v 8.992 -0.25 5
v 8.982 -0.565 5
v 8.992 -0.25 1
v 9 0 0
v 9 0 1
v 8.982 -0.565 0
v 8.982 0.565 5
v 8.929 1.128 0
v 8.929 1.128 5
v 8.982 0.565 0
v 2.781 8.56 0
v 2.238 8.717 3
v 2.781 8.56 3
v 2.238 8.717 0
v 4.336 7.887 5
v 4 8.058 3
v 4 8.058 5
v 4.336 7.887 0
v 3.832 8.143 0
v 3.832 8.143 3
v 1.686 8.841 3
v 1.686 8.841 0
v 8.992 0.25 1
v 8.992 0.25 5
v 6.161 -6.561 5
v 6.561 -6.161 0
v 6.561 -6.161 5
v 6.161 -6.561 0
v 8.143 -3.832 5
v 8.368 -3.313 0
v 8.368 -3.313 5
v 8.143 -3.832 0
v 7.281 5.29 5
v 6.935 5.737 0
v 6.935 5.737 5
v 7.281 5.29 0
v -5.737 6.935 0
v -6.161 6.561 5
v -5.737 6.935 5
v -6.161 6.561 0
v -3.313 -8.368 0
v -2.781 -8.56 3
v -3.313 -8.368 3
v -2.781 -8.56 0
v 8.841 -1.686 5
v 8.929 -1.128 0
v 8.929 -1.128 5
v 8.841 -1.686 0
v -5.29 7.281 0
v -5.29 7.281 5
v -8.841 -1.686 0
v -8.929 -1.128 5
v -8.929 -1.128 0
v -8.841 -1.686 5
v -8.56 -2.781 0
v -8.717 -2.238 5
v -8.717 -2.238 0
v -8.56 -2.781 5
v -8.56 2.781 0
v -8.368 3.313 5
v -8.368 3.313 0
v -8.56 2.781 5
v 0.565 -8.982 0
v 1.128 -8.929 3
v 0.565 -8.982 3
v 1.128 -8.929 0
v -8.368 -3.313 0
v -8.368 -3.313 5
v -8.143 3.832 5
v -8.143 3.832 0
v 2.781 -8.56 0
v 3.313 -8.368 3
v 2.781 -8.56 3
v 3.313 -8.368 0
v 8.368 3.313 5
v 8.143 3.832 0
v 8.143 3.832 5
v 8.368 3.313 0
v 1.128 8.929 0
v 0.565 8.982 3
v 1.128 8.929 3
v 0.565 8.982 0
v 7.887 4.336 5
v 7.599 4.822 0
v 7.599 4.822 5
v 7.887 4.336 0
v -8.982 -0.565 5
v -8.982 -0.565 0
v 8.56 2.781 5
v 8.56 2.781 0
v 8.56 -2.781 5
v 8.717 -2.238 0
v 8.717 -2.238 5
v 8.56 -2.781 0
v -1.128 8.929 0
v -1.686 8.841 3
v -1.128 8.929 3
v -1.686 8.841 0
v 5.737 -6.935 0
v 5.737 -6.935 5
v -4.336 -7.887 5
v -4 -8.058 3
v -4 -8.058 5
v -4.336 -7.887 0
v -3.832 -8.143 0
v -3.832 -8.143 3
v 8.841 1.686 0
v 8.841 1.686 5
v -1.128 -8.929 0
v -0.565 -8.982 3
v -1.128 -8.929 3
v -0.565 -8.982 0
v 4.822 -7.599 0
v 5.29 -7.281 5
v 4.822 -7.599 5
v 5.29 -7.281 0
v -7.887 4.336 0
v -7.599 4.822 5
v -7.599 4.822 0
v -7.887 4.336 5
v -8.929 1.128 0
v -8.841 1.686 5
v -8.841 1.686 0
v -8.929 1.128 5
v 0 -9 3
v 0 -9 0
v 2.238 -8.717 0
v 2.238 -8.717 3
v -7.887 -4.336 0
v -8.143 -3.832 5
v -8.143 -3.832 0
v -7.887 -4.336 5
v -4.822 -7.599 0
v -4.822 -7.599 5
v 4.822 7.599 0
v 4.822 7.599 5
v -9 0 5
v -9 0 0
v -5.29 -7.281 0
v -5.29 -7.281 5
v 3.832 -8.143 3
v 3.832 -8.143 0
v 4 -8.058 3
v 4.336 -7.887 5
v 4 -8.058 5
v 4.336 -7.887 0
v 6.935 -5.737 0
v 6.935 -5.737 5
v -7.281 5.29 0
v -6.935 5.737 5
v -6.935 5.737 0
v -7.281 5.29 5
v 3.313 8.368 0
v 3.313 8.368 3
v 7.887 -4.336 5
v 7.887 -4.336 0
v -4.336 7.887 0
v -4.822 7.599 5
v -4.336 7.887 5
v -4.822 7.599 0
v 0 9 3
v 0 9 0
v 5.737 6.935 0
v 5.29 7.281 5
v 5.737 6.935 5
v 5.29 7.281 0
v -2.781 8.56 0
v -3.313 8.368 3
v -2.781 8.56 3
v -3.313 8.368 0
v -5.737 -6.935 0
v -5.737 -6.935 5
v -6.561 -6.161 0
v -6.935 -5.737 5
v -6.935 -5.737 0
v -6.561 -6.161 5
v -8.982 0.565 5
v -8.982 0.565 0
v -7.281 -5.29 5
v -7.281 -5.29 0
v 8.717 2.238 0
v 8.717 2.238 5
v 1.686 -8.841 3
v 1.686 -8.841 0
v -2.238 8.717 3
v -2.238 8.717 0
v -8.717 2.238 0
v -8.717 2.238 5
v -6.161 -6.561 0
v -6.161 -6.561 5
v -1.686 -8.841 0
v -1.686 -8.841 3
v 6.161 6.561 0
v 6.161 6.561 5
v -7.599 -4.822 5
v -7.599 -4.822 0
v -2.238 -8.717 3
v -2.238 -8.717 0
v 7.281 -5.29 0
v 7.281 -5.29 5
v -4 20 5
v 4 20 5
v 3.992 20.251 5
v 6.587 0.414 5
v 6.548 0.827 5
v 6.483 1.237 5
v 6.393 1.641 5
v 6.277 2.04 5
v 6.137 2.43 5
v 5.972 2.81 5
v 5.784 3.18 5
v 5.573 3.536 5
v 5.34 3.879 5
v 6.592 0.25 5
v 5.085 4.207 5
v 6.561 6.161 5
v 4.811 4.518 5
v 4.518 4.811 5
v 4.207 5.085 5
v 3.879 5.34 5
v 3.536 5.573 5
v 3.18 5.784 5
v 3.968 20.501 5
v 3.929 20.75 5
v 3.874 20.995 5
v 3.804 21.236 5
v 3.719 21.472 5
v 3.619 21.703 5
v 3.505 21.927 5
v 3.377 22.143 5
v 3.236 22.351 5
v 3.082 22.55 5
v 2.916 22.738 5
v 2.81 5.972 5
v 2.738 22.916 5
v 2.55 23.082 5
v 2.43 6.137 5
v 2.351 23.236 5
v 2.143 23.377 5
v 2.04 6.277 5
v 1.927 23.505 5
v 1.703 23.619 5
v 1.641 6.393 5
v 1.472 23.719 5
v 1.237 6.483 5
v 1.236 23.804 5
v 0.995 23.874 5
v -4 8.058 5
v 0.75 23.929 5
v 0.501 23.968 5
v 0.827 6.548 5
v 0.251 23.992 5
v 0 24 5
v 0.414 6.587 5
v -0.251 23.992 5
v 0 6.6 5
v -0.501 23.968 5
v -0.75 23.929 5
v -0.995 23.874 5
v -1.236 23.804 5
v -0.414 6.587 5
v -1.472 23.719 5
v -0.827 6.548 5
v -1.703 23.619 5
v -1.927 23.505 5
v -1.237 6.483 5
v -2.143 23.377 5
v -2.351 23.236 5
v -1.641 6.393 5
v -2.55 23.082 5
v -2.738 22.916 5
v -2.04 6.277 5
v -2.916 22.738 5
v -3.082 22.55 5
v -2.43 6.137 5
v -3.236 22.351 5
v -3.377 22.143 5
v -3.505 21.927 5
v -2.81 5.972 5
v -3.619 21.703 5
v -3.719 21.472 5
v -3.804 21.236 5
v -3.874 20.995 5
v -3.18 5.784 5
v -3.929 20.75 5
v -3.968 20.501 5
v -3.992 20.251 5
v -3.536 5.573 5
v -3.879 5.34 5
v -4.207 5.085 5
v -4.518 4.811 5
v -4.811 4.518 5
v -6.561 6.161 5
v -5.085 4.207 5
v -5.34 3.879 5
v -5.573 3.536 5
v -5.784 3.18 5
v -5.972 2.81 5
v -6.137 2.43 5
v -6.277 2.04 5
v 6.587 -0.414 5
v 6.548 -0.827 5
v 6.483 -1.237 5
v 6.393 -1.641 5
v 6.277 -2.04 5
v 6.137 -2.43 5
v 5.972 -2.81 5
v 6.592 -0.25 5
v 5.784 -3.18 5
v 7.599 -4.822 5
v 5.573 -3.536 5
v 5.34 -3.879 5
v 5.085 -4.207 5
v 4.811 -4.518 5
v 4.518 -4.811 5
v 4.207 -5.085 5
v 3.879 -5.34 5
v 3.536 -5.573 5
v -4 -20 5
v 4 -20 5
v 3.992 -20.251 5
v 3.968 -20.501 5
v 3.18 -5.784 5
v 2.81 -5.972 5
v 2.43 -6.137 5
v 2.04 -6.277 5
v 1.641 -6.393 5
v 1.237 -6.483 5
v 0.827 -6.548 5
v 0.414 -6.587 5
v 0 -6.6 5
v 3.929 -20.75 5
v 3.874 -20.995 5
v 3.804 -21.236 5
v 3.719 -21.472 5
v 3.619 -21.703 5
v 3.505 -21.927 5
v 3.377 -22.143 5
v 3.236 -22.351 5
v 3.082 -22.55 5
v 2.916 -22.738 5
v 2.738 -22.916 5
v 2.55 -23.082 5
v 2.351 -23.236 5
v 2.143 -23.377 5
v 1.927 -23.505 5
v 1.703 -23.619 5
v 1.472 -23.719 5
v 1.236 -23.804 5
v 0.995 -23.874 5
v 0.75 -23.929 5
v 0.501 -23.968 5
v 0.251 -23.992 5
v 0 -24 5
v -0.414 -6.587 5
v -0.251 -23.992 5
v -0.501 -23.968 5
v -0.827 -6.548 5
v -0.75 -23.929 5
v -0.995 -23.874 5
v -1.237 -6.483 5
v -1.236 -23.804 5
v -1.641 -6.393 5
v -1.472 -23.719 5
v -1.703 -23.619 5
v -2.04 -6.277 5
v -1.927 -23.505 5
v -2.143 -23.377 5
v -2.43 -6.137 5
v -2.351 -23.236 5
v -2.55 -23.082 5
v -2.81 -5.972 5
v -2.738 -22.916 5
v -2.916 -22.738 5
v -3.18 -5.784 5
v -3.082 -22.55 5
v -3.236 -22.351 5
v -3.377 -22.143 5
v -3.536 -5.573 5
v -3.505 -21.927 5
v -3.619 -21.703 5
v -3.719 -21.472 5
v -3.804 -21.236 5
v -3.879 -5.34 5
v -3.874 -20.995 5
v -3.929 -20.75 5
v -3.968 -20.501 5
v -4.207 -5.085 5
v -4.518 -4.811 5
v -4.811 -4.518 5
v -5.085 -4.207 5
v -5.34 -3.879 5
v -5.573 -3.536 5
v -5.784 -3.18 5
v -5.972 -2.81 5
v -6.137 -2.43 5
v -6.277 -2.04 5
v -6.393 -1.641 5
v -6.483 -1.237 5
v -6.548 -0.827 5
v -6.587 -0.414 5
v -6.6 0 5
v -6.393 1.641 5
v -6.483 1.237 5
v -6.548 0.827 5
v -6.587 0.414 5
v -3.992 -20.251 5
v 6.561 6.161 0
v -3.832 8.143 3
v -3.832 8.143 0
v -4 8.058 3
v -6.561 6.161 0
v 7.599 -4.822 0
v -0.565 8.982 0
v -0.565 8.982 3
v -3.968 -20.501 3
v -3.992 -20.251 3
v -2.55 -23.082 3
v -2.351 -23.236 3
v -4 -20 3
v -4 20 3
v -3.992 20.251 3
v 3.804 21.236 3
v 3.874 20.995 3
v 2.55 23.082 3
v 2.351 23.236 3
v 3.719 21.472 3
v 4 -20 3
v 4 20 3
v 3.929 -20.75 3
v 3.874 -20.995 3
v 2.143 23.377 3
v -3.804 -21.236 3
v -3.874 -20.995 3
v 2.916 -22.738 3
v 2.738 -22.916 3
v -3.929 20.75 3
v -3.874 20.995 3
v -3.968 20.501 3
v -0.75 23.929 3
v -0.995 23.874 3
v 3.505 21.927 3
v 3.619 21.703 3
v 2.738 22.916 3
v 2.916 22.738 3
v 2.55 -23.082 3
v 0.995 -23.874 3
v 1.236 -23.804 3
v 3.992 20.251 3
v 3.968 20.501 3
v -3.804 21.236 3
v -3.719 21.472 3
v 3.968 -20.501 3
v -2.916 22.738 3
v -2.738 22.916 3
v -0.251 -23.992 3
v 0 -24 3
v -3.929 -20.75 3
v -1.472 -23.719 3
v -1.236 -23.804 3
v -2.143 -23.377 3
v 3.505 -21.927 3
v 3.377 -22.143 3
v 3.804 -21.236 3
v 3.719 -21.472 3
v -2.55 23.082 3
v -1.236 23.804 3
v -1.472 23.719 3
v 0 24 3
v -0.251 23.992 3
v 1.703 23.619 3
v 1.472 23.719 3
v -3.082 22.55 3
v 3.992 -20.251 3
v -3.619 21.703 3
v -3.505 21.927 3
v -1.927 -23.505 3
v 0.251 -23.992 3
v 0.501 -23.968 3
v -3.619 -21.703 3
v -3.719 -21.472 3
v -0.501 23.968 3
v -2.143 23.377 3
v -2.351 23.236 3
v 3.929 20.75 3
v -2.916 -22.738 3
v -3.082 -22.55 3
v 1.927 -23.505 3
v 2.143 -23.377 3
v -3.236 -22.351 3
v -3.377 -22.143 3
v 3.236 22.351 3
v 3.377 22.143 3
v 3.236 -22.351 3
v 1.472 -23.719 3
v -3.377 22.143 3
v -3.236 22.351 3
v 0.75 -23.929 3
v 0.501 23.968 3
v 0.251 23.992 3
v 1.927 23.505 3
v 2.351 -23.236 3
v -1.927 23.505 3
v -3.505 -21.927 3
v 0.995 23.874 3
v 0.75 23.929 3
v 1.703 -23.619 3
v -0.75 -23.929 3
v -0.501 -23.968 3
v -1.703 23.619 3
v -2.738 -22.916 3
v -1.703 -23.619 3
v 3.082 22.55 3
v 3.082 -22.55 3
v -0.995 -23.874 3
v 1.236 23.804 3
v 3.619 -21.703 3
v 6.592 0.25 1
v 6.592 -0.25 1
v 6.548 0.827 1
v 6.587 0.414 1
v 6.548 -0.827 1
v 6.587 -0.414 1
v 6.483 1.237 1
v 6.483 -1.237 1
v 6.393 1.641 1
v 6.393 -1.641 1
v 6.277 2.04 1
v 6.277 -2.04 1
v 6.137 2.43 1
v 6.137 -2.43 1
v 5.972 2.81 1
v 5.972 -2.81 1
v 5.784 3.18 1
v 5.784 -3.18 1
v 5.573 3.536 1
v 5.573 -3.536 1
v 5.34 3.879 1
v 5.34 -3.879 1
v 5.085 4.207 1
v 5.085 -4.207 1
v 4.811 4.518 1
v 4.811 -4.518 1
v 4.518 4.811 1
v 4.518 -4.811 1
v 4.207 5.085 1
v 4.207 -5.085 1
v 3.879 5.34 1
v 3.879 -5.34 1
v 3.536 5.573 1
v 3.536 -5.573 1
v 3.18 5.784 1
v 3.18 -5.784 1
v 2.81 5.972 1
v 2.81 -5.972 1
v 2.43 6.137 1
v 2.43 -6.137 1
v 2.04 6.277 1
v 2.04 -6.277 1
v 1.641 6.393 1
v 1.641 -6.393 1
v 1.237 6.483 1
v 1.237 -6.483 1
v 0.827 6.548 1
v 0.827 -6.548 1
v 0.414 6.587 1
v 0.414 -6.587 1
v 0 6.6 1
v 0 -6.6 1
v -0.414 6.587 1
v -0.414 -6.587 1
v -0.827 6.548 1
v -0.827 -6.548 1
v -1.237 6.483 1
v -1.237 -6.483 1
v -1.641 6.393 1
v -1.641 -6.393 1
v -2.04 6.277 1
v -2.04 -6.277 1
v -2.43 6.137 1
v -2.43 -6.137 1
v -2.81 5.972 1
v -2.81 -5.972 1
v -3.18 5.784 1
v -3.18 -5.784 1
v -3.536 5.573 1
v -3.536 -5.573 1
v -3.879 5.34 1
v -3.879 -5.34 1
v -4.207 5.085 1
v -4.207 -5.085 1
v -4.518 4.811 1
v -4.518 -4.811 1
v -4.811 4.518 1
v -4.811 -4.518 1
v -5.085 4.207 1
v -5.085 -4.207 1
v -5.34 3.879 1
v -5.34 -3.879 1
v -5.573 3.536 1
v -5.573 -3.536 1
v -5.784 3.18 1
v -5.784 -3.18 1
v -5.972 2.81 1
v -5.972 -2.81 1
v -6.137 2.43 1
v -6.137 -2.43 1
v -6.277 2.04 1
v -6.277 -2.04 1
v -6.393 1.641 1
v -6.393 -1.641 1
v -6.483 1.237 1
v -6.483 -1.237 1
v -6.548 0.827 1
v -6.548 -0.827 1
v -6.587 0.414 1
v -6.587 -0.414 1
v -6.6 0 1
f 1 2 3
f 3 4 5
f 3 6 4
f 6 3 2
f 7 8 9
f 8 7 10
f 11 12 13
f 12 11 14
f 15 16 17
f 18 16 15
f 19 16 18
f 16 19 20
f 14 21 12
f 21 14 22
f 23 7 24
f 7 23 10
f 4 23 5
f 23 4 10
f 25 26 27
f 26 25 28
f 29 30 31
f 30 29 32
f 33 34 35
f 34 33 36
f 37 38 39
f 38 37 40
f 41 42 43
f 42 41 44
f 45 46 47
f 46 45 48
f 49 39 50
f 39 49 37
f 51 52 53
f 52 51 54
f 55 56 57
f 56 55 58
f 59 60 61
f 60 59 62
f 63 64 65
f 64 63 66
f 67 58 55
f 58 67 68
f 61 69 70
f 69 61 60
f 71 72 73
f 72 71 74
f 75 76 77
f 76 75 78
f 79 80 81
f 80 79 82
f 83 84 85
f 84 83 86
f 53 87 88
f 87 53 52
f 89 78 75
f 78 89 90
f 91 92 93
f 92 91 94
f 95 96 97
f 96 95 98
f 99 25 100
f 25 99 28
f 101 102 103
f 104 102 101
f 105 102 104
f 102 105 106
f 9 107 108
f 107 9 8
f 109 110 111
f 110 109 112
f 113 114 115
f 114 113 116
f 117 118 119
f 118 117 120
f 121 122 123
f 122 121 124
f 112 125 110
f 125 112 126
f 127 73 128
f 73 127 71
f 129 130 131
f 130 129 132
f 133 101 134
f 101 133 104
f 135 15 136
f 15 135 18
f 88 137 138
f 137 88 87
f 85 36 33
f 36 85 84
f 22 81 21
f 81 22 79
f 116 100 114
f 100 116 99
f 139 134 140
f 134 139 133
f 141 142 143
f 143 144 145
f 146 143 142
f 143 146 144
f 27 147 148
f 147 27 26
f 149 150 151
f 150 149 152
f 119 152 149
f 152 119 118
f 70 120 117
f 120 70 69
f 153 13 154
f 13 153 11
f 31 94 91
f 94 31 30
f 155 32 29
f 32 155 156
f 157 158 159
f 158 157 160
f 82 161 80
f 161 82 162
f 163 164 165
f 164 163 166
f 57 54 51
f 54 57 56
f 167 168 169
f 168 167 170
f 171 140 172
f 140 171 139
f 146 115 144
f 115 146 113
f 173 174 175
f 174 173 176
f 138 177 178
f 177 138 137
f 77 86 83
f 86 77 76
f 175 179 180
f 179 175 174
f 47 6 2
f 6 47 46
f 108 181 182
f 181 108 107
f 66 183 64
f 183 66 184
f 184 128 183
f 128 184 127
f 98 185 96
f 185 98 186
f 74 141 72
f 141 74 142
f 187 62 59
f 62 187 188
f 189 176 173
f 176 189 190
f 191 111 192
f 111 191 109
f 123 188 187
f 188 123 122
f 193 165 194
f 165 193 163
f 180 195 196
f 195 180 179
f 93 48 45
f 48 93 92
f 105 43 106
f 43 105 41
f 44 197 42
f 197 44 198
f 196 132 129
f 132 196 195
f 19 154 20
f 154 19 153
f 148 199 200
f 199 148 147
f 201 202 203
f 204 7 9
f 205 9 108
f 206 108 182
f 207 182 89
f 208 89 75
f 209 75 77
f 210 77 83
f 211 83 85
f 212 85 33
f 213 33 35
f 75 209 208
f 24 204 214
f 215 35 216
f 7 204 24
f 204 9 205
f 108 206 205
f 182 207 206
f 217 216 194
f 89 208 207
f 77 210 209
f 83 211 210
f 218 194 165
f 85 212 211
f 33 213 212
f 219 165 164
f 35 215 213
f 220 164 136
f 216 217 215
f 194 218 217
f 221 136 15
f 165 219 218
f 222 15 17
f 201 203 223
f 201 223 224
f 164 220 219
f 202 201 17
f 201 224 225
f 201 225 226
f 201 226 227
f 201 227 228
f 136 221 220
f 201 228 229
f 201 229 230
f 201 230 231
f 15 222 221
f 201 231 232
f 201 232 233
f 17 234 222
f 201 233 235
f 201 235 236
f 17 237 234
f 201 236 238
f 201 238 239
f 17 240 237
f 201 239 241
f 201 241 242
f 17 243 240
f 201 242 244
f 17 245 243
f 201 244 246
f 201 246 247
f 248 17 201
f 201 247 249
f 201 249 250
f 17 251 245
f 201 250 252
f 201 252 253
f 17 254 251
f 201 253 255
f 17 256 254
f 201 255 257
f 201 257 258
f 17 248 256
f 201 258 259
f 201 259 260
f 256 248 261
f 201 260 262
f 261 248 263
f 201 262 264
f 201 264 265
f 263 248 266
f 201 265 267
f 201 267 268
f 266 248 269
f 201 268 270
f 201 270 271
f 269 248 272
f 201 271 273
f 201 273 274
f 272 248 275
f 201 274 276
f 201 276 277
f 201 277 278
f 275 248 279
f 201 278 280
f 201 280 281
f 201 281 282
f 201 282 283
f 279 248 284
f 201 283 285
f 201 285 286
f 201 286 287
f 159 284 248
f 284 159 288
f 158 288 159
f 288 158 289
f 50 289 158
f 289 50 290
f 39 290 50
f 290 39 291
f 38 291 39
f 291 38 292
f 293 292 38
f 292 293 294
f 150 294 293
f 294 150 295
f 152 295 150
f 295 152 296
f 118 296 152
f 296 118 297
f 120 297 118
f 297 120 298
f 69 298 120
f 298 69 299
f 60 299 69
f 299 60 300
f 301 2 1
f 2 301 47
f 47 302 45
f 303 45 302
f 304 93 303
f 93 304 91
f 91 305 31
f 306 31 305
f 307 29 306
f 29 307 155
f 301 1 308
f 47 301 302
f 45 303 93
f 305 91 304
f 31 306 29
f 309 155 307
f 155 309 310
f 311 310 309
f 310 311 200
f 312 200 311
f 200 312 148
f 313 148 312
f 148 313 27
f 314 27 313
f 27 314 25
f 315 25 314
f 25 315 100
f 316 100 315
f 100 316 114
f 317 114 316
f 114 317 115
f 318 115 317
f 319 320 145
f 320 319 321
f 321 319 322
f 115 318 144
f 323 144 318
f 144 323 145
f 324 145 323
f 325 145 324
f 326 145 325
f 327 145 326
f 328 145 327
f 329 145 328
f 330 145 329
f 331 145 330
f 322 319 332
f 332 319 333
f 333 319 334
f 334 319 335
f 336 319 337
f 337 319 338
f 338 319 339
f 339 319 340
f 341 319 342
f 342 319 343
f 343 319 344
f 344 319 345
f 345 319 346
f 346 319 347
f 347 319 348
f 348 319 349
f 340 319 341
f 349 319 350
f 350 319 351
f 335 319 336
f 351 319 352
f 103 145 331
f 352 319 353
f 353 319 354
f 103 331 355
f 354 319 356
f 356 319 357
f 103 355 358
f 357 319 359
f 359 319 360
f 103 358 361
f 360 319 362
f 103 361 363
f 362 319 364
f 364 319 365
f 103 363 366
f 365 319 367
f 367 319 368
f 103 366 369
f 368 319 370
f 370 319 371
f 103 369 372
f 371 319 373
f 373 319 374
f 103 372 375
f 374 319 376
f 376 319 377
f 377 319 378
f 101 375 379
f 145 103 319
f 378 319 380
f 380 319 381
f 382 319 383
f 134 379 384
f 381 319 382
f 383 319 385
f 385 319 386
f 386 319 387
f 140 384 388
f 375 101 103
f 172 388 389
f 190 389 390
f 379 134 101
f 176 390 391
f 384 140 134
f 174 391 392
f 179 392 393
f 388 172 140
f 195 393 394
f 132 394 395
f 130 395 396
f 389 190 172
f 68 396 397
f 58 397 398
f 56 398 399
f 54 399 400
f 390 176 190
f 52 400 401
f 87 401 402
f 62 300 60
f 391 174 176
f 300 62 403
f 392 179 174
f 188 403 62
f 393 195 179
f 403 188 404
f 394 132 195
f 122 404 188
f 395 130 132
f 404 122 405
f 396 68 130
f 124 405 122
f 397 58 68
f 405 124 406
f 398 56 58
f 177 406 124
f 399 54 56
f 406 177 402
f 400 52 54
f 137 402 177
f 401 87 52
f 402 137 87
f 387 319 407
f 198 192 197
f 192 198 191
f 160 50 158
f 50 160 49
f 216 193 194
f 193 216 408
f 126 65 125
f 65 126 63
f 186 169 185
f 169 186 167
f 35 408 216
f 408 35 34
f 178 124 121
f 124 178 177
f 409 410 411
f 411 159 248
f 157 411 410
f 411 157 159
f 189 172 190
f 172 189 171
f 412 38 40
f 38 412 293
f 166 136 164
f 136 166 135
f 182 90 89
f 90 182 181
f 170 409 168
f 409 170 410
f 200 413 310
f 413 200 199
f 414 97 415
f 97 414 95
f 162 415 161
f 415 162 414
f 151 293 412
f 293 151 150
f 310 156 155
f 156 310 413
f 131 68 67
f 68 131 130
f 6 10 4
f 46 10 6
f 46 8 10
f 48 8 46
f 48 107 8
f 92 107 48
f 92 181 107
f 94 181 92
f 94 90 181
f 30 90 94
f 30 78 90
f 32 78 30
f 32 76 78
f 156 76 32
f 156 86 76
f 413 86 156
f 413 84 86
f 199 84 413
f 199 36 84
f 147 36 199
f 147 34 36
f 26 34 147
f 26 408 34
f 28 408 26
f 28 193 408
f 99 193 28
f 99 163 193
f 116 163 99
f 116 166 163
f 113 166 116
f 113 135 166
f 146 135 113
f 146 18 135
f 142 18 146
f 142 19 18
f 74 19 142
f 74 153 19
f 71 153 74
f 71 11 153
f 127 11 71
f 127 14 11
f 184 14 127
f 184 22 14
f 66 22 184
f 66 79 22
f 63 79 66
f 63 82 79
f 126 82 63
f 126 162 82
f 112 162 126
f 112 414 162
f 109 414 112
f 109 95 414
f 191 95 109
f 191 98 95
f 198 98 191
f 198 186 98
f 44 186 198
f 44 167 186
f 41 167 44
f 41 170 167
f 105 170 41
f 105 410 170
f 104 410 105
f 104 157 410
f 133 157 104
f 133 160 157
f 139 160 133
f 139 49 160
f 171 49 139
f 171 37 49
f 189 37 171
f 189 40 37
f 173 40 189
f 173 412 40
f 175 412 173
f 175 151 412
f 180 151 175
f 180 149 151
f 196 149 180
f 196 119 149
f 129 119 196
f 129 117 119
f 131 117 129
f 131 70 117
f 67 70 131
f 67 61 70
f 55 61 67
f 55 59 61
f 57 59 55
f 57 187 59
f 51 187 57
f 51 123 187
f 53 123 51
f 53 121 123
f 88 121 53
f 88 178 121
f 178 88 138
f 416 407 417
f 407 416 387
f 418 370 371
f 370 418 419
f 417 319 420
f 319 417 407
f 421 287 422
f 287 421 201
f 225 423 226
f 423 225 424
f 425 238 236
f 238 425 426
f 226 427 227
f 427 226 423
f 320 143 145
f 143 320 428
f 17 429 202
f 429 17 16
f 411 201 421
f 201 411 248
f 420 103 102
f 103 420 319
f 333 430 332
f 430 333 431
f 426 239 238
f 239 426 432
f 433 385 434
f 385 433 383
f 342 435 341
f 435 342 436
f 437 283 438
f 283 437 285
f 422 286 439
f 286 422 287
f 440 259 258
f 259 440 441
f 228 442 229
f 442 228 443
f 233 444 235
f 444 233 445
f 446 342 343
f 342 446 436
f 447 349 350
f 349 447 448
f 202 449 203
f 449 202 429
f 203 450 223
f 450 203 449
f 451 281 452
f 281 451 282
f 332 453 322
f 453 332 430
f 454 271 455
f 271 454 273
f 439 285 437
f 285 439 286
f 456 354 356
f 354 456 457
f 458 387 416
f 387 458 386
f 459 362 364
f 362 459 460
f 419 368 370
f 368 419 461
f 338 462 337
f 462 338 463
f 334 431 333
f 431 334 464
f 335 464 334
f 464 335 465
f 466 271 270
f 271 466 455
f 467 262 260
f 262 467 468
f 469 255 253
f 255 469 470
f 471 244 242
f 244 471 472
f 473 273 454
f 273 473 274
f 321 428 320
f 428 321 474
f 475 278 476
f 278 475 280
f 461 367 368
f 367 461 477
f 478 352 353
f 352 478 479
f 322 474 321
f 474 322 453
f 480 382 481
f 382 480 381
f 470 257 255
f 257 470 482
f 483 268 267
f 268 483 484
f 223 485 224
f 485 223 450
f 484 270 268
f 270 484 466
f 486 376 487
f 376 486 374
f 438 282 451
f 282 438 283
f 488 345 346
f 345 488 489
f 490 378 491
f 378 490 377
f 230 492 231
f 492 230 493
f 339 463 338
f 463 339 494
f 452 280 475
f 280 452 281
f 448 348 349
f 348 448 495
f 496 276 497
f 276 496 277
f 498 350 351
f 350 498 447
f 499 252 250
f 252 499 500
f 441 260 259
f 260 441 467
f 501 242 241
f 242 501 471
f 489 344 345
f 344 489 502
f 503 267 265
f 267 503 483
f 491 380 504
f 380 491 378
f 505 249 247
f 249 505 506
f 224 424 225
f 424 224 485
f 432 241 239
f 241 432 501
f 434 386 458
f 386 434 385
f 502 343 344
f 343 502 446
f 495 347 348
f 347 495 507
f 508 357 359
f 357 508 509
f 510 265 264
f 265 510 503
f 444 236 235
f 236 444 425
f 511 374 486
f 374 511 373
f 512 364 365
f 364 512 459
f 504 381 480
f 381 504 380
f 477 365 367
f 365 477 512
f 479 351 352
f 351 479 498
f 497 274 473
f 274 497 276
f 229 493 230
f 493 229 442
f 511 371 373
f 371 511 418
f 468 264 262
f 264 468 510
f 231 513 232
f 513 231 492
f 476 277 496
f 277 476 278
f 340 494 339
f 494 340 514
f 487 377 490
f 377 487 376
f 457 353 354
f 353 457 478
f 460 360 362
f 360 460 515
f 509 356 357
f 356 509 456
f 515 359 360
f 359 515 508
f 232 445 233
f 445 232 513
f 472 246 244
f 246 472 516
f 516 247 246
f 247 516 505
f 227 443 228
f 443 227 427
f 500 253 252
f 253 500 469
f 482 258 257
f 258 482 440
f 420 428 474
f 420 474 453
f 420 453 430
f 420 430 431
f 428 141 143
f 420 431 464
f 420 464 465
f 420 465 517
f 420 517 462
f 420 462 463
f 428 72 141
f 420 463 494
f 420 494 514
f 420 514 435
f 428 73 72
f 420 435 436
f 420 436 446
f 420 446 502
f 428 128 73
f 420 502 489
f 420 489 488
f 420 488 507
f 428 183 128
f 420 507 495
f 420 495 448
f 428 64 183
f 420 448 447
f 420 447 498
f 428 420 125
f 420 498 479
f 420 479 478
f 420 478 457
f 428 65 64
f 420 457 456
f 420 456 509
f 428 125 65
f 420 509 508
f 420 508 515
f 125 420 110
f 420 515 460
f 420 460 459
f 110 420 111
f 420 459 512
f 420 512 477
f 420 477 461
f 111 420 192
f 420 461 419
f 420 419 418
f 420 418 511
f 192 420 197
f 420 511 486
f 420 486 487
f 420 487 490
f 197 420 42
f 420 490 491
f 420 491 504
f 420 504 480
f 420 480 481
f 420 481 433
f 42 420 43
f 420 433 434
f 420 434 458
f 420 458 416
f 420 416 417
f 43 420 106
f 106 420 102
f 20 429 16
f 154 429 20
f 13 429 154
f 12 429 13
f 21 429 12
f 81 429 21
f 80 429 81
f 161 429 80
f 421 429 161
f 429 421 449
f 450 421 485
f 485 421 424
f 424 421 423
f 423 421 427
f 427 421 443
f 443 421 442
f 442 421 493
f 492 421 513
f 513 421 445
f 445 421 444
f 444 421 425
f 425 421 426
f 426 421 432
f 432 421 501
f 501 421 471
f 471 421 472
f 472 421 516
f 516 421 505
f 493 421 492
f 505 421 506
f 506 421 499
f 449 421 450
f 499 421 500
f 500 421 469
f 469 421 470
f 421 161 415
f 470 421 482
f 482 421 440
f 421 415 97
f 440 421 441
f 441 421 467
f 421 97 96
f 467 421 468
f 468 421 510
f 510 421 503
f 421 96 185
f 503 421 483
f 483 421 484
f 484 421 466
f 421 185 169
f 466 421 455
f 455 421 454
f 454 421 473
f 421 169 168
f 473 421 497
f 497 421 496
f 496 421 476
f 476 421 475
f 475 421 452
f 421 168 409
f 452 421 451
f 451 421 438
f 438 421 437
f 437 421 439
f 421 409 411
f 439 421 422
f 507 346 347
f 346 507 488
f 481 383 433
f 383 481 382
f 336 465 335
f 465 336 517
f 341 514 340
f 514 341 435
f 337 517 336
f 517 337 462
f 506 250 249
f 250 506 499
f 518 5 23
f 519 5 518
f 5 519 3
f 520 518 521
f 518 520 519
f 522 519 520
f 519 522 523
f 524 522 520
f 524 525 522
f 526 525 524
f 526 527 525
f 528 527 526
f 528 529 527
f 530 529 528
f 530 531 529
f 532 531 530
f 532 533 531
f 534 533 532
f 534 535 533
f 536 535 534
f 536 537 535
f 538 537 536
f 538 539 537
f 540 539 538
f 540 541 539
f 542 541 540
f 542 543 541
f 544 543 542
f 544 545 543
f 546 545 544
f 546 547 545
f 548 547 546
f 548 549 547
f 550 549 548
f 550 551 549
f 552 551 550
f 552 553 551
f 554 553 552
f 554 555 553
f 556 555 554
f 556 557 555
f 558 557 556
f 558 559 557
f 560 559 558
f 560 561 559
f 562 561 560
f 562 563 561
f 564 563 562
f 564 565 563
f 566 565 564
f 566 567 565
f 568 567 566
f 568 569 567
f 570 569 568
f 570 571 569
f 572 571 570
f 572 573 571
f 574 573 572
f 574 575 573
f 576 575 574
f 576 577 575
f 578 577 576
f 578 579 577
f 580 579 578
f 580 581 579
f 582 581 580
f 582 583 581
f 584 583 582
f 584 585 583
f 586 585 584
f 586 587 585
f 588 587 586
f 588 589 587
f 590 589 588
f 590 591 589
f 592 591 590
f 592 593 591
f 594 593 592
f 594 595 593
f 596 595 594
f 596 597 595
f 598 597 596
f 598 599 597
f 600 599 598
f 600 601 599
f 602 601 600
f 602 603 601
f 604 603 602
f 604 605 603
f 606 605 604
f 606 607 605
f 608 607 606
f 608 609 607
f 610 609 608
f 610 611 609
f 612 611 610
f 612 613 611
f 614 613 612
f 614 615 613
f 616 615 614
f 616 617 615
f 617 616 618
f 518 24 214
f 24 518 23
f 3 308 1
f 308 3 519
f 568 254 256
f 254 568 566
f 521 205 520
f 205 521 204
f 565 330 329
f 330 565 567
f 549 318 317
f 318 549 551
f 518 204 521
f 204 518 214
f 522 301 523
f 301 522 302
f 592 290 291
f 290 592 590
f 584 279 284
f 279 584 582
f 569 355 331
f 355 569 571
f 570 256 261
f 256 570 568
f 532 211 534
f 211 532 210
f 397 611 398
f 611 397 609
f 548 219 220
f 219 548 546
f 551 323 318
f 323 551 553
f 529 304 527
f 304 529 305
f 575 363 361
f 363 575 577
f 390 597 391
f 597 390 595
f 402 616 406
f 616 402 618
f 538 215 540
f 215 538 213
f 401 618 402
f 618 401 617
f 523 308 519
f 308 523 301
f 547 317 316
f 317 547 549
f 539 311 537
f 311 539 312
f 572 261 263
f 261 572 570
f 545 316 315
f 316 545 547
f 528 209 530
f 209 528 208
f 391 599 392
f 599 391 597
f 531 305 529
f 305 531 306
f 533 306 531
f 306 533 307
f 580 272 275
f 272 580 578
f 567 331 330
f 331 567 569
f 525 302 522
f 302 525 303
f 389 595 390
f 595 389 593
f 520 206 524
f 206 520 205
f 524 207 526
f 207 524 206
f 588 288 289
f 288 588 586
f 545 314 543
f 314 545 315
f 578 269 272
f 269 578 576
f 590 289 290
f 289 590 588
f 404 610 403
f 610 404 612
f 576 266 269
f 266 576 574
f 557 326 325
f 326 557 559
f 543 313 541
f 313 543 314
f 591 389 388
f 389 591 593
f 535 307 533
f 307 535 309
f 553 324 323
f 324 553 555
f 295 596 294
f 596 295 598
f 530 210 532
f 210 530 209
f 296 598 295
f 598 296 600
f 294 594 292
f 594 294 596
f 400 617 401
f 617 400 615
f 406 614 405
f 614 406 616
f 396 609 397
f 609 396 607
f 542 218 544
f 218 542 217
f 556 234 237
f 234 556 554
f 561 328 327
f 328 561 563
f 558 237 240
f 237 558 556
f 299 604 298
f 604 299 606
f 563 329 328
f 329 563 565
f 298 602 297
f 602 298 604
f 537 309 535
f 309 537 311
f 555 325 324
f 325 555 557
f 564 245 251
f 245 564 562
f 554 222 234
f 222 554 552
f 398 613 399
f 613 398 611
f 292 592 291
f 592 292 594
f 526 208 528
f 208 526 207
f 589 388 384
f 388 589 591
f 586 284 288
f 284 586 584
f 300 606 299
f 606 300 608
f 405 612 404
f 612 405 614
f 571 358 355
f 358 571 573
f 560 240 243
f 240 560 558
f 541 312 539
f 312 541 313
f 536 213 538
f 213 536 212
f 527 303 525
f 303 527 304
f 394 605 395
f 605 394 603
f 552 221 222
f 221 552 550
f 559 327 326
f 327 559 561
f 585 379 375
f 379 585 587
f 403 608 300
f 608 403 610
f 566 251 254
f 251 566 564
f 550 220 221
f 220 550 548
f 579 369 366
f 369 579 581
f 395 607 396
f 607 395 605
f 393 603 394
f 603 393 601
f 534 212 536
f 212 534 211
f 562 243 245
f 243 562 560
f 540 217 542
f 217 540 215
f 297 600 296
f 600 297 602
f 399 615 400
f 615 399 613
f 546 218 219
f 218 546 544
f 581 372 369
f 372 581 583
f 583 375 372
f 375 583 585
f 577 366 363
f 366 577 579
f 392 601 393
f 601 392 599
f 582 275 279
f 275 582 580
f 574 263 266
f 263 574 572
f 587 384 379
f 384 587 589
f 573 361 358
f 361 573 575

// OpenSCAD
difference(){
    union(){
        linear_extrude(5) circle(9,$fn=100);
        translate([0,0,3]) linear_extrude(2)  hull() {
            translate([0,20,0]) circle(4,$fn=100);
            translate([0,-20,0]) circle(4,$fn=100);
        }
    }
    translate([5,-0.25,1]) linear_extrude(4) square([5,0.5]);
    translate([0,0,1]) linear_extrude(4) circle(6.6,$fn=100);
}
